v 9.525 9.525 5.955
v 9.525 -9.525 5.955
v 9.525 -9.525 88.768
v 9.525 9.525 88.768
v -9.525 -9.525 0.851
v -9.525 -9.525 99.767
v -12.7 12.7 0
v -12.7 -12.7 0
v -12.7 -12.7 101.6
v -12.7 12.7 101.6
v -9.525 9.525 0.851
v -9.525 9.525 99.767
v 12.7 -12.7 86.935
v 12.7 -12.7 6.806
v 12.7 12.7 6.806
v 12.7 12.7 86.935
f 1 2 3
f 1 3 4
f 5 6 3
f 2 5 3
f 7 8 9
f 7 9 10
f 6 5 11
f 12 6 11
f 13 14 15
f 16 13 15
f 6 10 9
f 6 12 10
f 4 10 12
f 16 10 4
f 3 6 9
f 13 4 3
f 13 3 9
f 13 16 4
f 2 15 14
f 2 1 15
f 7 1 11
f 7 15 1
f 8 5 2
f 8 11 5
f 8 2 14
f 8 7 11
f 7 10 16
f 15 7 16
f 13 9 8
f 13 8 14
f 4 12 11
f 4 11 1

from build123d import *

# Parameters (mm, degrees)
SKETCH1_W           = 25.4
SKETCH1_H           = 25.4
SKETCH1_W_2         = 19.05
SKETCH1_H_2         = 19.05
BOSS_EXTRUDE1_DEPTH = 101.6
SKETCH2_W           = 25.4
SKETCH2_H           = 26.296014983
CUT_EXTRUDE1_DEPTH  = 101.161834767
SKETCH5_W           = 25.4
SKETCH5_H           = 29.329393675
CUT_EXTRUDE2_DEPTH  = 90.577773471


with BuildPart() as part:
    # Sketch1 → Boss-Extrude1 (new body)
    with BuildSketch(Plane.XY):
        Rectangle(SKETCH1_W, SKETCH1_H)
        Rectangle(SKETCH1_W_2, SKETCH1_H_2, mode=Mode.SUBTRACT)
    extrude(amount=BOSS_EXTRUDE1_DEPTH)

    # Sketch2 → Cut-Extrude1 (cut, through all)
    with BuildSketch(Plane(origin=(-0.850738686, 0, 3.175), x_dir=(0, -1, 0), z_dir=(0.25881904510252135, 0, -0.9659258262890681))):
        with Locations((0, -0.880749498)):
            Rectangle(SKETCH2_W, SKETCH2_H)
    extrude(amount=CUT_EXTRUDE1_DEPTH, mode=Mode.SUBTRACT)

    # Sketch5 → Cut-Extrude2 (cut, through all)
    with BuildSketch(Plane(origin=(40.819090512, 0, 70.700738686), x_dir=(0, -1, 0), z_dir=(0.4999999999999889, 0, 0.866025403784445))):
        with Locations((0, -47.13382579)):
            Rectangle(SKETCH5_W, SKETCH5_H)
    extrude(amount=CUT_EXTRUDE2_DEPTH, mode=Mode.SUBTRACT)


solid = part.part
